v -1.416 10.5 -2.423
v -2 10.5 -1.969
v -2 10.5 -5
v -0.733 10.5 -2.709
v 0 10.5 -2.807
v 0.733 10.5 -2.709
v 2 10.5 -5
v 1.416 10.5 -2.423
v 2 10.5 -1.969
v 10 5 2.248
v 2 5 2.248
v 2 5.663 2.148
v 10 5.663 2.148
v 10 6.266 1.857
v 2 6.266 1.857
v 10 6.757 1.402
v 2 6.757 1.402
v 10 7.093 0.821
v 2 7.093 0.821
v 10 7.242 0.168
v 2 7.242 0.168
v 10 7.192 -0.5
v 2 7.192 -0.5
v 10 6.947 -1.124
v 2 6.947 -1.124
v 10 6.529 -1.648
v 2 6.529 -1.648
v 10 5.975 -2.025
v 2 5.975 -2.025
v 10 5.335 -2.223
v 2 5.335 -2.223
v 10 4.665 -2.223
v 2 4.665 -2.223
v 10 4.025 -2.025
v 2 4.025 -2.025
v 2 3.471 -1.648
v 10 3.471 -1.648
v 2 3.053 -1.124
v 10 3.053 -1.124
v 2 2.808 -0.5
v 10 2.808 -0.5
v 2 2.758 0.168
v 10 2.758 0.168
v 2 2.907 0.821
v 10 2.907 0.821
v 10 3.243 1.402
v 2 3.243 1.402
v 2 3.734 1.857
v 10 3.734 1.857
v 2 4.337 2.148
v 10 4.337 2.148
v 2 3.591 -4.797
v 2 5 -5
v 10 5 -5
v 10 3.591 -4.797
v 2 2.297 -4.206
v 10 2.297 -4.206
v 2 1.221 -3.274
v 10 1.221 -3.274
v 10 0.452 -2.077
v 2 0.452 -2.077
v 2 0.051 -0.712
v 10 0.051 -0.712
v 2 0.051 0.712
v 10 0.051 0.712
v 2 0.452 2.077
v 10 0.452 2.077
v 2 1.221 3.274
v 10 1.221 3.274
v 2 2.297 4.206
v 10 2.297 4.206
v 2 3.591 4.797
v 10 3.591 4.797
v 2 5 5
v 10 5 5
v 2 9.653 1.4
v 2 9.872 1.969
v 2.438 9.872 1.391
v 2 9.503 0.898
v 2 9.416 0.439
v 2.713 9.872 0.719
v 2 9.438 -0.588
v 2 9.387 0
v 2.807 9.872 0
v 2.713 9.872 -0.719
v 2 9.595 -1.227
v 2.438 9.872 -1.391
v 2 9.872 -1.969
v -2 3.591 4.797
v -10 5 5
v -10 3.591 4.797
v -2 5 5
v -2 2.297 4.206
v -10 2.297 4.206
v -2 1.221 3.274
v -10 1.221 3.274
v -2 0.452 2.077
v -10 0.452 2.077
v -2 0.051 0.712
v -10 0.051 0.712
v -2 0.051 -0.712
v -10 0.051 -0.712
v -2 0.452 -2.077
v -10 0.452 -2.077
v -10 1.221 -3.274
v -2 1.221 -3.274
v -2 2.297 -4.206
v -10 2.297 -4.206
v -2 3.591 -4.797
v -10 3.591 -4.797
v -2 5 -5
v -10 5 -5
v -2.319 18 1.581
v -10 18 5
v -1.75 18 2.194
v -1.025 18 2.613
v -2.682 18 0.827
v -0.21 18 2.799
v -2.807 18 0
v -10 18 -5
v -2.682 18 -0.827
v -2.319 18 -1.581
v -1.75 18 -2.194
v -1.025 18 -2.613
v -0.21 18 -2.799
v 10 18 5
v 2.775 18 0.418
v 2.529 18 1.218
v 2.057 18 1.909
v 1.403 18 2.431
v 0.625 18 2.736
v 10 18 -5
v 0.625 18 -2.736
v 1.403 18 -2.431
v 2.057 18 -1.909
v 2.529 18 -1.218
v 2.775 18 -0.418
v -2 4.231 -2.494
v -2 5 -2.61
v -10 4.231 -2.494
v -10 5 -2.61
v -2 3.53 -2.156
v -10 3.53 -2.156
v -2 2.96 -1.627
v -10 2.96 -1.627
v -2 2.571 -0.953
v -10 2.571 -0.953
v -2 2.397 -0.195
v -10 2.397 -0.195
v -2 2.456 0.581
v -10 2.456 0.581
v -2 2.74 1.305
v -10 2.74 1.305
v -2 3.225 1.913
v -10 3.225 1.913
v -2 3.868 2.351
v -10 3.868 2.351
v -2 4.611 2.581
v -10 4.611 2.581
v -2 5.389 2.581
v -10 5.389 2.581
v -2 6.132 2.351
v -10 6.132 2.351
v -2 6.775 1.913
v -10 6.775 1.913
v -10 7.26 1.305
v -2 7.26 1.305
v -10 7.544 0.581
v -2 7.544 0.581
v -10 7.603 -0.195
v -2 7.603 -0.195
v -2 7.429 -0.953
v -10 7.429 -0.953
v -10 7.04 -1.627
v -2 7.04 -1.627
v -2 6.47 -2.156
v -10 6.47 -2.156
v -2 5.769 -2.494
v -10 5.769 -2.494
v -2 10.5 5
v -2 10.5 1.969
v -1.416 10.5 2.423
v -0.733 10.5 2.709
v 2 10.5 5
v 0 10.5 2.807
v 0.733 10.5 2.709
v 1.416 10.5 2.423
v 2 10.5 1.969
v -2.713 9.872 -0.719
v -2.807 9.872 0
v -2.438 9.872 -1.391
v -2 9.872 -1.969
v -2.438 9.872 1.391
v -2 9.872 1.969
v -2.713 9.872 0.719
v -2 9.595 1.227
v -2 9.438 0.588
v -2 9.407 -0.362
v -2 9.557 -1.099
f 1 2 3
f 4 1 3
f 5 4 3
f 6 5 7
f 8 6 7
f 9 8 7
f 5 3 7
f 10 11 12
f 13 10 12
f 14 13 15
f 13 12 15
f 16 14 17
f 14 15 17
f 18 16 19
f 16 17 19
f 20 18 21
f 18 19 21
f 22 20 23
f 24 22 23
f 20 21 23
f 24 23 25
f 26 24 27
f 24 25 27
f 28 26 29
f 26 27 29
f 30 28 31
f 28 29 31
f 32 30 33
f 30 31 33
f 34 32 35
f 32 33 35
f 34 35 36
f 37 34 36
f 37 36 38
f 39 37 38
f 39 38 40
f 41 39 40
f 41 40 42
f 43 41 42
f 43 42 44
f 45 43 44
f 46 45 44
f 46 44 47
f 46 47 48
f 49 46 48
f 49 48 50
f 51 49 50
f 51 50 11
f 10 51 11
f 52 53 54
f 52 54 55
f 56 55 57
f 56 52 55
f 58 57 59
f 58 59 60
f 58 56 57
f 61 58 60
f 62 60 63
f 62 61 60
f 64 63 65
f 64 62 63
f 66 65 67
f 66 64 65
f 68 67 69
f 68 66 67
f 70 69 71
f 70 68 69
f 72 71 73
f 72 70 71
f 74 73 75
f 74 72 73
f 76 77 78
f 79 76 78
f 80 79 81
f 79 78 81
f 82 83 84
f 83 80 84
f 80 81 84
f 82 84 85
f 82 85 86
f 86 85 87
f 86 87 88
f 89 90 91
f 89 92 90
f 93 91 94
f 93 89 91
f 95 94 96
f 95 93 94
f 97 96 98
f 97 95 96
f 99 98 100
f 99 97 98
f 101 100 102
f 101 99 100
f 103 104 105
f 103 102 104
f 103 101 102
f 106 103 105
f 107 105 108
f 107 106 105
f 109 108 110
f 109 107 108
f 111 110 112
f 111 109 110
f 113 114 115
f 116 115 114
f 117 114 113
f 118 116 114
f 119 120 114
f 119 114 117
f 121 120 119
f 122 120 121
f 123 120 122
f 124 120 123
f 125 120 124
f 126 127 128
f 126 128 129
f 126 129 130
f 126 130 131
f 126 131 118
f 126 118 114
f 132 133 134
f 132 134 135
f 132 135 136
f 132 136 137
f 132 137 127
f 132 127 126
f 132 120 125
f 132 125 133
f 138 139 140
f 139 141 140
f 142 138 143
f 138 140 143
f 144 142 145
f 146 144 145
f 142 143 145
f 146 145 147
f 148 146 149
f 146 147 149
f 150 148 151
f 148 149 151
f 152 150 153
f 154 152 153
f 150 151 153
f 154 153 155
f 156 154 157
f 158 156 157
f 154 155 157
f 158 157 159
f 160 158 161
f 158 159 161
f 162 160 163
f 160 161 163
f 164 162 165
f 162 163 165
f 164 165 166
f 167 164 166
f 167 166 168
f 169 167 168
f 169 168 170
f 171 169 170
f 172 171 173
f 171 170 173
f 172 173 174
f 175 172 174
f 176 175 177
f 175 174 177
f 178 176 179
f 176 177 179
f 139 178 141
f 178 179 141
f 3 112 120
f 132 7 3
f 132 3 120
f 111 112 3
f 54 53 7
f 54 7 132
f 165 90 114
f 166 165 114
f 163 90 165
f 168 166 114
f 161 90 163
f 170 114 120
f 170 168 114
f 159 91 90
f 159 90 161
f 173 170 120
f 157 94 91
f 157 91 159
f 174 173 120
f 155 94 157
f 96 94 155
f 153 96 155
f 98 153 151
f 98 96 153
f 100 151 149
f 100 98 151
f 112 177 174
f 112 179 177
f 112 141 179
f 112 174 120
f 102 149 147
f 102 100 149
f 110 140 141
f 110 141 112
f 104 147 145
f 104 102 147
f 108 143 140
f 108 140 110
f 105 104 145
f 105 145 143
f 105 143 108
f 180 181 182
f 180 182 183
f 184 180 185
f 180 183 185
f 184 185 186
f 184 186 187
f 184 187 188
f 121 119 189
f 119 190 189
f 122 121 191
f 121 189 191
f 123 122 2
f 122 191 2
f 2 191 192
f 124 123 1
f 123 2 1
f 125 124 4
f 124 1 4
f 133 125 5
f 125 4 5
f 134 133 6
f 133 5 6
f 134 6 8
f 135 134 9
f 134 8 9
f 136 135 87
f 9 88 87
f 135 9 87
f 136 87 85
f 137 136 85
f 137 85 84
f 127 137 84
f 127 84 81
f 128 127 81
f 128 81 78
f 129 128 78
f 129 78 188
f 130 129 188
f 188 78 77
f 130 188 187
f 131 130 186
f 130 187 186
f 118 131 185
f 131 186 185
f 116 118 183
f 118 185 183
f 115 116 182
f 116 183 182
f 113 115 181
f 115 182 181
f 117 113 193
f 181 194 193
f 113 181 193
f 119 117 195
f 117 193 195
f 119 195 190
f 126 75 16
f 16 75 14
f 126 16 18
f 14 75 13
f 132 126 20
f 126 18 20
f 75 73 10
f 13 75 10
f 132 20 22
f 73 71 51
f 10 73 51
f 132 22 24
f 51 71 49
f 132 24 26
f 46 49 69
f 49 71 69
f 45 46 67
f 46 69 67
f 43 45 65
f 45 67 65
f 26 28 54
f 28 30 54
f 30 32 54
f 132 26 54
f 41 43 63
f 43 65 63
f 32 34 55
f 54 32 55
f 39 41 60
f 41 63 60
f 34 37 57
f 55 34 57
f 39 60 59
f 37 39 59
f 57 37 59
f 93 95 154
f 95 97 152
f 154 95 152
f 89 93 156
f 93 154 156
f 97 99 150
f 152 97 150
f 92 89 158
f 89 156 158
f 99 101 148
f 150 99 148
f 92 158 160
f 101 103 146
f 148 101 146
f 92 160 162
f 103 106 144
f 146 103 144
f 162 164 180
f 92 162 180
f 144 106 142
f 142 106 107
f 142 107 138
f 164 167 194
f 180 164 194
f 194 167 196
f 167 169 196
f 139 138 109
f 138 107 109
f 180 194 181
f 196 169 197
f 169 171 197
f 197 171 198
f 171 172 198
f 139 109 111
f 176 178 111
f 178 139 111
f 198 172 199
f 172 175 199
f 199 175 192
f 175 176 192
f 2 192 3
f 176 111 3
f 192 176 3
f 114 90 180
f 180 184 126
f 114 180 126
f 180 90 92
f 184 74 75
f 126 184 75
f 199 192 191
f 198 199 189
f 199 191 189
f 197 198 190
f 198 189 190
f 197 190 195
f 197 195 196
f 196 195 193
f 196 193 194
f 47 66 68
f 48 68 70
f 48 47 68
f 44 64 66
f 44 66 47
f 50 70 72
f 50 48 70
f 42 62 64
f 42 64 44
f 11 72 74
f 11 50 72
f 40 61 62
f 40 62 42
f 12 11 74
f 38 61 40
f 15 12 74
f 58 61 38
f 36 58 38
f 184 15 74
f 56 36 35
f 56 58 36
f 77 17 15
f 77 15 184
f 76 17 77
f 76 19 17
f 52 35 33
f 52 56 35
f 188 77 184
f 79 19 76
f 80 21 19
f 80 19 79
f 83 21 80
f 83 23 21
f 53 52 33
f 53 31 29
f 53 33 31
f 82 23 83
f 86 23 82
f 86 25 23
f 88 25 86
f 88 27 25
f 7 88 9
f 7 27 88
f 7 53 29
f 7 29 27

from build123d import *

# Parameters (mm, degrees)
SKETCH1_W                       = 20
SKETCH1_H                       = 10
BOSS_EXTRUDE1_DEPTH             = 18
CUT_EXTRUDE1_DEPTH              = 22.1896201
CUT_EXTRUDE1_DEPTH_BACK         = 22.1896201
SKETCH2_W                       = 4
SKETCH2_H                       = 10.5
F_16_0_177_DIAMETER_HOLE1_D     = 4.4958
F_16_0_177_DIAMETER_HOLE1_DEPTH = 8
SKETCH6_W                       = 2.60985
SKETCH6_H                       = 8
F_2_0_221_DIAMETER_HOLE1_D      = 5.6134
F_2_0_221_DIAMETER_HOLE1_DEPTH  = 8.128
F_2_0_221_DIAMETER_HOLE1_TIP    = 1.686435499
FILLET2_RADIUS                  = 5
FILLET2_LENGTH                  = 8
FILLET3_RADIUS                  = 5
FILLET3_LENGTH                  = 8


with BuildPart() as part:
    # Sketch1 → Boss-Extrude1 (new body)
    with BuildSketch(Plane(origin=(0, 0, 0), x_dir=(1, 0, 0), z_dir=(0, 1, 0))):
        Rectangle(SKETCH1_W, SKETCH1_H)
    extrude(amount=BOSS_EXTRUDE1_DEPTH)

    # Sketch2 → Cut-Extrude1 (cut, two sides: drawn at the far end of the back side and taken through both)
    with BuildSketch(Plane.XY.offset(-CUT_EXTRUDE1_DEPTH_BACK)):
        with Locations((0, 5.25)):
            Rectangle(SKETCH2_W, SKETCH2_H)
    extrude(amount=CUT_EXTRUDE1_DEPTH + CUT_EXTRUDE1_DEPTH_BACK, mode=Mode.SUBTRACT)

    # #16 (0.177) Diameter Hole1
    with Locations(Plane(origin=(10, 0, 0), x_dir=(0, 0, -1), z_dir=(1, 0, 0))):
        with Locations((0, 5)):
            Hole(F_16_0_177_DIAMETER_HOLE1_D / 2, depth=F_16_0_177_DIAMETER_HOLE1_DEPTH)

    # Sketch6 → #5 (0.2055) Diameter Hole1 (revolve, cut)
    with BuildSketch(Plane(origin=(-2, 5, 0), x_dir=(0, 0, -1), z_dir=(0, 1, 0))):
        with Locations((1.304925, 4)):
            Rectangle(SKETCH6_W, SKETCH6_H)
    revolve(axis=Axis((4.35, 5, 0), (-1, 0, 0)), mode=Mode.SUBTRACT)

    # #2 (0.221) Diameter Hole1
    with Locations(Plane(origin=(0, 18, 0), x_dir=(1, 0, 0), z_dir=(0, 1, 0))):
        with Locations((0, 0)):
            Hole(F_2_0_221_DIAMETER_HOLE1_D / 2, depth=F_2_0_221_DIAMETER_HOLE1_DEPTH)
            with Locations((0, 0, -(F_2_0_221_DIAMETER_HOLE1_DEPTH + F_2_0_221_DIAMETER_HOLE1_TIP / 2))):  # 118° drill point
                Cone(0, F_2_0_221_DIAMETER_HOLE1_D / 2, F_2_0_221_DIAMETER_HOLE1_TIP, mode=Mode.SUBTRACT)

    # Fillet2: full round fillet: the end face becomes a half cylinder, R = half its width
    fillet2_face = Plane((-6, 0, 0), x_dir=(1, 0, 0), z_dir=(0, -1, 0))  # on the end face: x along it, z out of the body
    fillet2_slab = fillet2_face.offset(-FILLET2_RADIUS / 2) * Box(FILLET2_LENGTH, 2 * FILLET2_RADIUS, FILLET2_RADIUS, mode=Mode.PRIVATE)  # the body's end, R deep
    fillet2_round = Plane((-6, 5, 0), x_dir=(0, -1, 0), z_dir=(1, 0, 0)) * Cylinder(FILLET2_RADIUS, FILLET2_LENGTH, mode=Mode.PRIVATE)  # its axis R under the face
    add(fillet2_slab - fillet2_round, mode=Mode.SUBTRACT)

    # Fillet3: full round fillet: the end face becomes a half cylinder, R = half its width
    fillet3_face = Plane((6, 0, 0), x_dir=(-1, 0, 0), z_dir=(0, -1, 0))  # on the end face: x along it, z out of the body
    fillet3_slab = fillet3_face.offset(-FILLET3_RADIUS / 2) * Box(FILLET3_LENGTH, 2 * FILLET3_RADIUS, FILLET3_RADIUS, mode=Mode.PRIVATE)  # the body's end, R deep
    fillet3_round = Plane((6, 5, 0), x_dir=(0, -1, 0), z_dir=(-1, 0, 0)) * Cylinder(FILLET3_RADIUS, FILLET3_LENGTH, mode=Mode.PRIVATE)  # its axis R under the face
    add(fillet3_slab - fillet3_round, mode=Mode.SUBTRACT)


solid = part.part
